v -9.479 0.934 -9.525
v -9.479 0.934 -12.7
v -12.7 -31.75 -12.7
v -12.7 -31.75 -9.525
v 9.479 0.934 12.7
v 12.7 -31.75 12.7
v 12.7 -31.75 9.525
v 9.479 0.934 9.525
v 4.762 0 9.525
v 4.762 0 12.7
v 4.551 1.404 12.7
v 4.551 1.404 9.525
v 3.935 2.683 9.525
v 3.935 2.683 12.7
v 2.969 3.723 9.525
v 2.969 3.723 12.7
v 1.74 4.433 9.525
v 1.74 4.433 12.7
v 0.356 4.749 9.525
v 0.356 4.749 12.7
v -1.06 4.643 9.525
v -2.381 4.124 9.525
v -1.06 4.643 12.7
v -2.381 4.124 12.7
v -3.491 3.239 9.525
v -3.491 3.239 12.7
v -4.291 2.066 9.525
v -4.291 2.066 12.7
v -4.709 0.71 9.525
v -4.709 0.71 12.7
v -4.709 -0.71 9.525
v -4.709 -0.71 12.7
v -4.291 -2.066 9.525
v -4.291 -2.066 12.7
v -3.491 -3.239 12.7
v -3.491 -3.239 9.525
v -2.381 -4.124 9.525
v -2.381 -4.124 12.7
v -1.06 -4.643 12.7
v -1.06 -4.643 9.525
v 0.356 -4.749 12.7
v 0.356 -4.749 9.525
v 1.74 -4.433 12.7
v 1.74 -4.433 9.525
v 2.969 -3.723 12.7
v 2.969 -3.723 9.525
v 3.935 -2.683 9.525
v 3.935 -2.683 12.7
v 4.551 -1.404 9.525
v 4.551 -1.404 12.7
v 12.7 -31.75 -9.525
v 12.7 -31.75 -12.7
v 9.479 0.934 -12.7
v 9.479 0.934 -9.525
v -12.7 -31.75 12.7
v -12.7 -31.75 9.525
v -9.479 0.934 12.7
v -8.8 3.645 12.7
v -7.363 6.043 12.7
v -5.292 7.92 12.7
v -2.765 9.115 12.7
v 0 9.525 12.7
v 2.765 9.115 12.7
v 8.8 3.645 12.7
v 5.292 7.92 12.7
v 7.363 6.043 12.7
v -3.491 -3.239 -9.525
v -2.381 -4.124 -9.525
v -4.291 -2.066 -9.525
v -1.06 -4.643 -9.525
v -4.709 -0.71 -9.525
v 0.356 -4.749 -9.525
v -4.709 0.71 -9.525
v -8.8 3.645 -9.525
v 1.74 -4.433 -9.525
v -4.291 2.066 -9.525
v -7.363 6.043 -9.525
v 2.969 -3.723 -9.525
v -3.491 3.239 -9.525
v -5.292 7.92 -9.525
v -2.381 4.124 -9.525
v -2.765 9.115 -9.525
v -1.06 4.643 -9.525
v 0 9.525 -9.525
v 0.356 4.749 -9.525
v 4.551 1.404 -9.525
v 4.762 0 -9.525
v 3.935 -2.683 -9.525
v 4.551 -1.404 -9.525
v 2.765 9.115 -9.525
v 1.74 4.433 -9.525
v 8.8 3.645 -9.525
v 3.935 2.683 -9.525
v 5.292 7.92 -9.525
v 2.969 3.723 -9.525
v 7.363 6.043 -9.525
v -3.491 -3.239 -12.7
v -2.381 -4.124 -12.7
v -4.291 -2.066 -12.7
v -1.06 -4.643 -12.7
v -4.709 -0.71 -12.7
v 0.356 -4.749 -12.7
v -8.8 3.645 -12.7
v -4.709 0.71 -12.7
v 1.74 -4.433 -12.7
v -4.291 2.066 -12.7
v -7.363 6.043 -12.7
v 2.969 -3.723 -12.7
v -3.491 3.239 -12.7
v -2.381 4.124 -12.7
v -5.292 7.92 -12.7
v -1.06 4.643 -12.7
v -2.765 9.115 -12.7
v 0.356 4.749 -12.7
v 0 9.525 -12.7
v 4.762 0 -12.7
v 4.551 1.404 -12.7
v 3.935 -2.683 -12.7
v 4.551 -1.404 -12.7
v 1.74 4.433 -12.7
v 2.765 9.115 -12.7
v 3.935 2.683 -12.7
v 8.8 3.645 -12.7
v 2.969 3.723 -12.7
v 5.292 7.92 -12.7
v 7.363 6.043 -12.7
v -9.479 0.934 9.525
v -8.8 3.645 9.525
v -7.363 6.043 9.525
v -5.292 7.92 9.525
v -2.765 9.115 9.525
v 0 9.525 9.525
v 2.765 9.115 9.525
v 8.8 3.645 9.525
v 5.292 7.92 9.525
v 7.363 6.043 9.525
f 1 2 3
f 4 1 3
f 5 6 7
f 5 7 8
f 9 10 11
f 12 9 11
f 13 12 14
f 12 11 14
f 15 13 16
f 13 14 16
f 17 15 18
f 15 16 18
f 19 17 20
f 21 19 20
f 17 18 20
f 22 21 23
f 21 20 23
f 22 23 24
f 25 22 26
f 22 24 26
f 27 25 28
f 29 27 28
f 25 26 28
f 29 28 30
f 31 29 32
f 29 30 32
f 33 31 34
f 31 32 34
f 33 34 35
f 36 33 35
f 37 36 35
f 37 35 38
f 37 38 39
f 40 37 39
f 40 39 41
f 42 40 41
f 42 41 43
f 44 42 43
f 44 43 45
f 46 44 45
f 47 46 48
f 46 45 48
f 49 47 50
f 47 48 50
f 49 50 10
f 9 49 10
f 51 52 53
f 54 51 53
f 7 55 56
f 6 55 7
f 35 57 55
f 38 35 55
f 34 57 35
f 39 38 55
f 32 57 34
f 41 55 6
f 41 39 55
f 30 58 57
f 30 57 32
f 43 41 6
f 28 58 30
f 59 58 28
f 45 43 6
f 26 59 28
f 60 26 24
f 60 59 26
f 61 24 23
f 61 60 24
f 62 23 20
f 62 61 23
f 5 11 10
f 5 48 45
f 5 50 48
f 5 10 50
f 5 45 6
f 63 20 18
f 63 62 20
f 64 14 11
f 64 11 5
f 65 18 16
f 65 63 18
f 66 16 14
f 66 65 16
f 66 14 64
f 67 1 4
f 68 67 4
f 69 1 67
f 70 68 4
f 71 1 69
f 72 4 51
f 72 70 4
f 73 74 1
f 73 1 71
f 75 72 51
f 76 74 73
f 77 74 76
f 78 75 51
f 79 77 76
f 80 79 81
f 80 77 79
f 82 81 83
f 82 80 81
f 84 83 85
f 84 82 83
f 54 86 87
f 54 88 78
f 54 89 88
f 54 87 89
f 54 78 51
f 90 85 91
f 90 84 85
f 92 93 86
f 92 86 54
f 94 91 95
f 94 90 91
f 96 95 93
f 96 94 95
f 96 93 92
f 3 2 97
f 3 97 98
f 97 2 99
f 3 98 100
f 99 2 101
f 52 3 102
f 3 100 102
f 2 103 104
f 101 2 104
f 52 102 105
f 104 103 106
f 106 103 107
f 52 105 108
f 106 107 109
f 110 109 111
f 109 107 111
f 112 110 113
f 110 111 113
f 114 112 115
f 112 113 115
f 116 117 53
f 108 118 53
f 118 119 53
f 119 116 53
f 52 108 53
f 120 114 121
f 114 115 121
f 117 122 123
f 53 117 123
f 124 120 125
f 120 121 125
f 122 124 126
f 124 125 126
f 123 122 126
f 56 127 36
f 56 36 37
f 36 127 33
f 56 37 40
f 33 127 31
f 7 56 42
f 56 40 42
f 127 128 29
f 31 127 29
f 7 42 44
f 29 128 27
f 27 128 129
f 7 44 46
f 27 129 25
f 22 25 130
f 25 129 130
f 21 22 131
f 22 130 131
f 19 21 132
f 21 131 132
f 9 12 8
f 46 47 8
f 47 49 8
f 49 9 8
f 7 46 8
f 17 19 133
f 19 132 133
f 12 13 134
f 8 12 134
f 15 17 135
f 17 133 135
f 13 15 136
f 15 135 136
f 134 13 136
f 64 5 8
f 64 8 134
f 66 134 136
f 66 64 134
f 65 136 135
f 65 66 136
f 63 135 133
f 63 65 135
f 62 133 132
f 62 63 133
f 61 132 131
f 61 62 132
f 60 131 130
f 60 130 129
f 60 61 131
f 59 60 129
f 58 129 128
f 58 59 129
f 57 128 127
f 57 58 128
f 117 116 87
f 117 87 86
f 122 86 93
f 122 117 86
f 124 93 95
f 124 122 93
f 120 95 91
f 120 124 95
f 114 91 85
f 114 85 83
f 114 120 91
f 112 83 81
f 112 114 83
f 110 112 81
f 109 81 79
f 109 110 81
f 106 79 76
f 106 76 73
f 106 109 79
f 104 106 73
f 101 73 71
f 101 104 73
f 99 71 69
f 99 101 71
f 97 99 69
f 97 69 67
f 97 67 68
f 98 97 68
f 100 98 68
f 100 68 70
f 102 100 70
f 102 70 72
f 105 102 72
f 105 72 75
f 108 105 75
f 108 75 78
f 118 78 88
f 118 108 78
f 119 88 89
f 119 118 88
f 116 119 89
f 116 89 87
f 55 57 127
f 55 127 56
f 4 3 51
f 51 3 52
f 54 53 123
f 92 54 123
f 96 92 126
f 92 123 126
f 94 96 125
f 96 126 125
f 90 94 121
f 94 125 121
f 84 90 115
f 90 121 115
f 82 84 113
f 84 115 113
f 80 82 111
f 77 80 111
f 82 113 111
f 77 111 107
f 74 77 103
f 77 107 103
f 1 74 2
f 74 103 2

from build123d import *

# Parameters (mm, degrees)
BOSS_EXTRUDE1_START = 12.7
SKETCH1_R           = 4.7625
BOSS_EXTRUDE1_DEPTH = 3.175
BOSS_EXTRUDE2_START = -12.7
SKETCH1_4_R         = 4.7625
BOSS_EXTRUDE2_DEPTH = 3.175


with BuildPart() as part:
    # Sketch1 → Boss-Extrude1 (new body)
    with BuildSketch(Plane.XY.offset(BOSS_EXTRUDE1_START)):
        with BuildLine():
            ThreePointArc((9.479083286, 0.934133315), (0, 9.525), (-9.479083286, 0.934133315))
            Line((-9.479083286, 0.934133315), (-12.7, -31.75))
            Line((-12.7, -31.75), (12.7, -31.75))
            Line((12.7, -31.75), (9.479083286, 0.934133315))
        make_face()
        Circle(SKETCH1_R, mode=Mode.SUBTRACT)
    extrude(amount=-BOSS_EXTRUDE1_DEPTH)


with BuildPart() as body_2:
    # Sketch1<4> → Boss-Extrude2 (new body)
    with BuildSketch(Plane.XY.offset(BOSS_EXTRUDE2_START)):
        with BuildLine():
            ThreePointArc((9.479083286, 0.934133315), (0, 9.525), (-9.479083286, 0.934133315))
            Line((-9.479083286, 0.934133315), (-12.7, -31.75))
            Line((-12.7, -31.75), (12.7, -31.75))
            Line((12.7, -31.75), (9.479083286, 0.934133315))
        make_face()
        Circle(SKETCH1_4_R, mode=Mode.SUBTRACT)
    extrude(amount=BOSS_EXTRUDE2_DEPTH)


solid = Compound([part.part, body_2.part])
